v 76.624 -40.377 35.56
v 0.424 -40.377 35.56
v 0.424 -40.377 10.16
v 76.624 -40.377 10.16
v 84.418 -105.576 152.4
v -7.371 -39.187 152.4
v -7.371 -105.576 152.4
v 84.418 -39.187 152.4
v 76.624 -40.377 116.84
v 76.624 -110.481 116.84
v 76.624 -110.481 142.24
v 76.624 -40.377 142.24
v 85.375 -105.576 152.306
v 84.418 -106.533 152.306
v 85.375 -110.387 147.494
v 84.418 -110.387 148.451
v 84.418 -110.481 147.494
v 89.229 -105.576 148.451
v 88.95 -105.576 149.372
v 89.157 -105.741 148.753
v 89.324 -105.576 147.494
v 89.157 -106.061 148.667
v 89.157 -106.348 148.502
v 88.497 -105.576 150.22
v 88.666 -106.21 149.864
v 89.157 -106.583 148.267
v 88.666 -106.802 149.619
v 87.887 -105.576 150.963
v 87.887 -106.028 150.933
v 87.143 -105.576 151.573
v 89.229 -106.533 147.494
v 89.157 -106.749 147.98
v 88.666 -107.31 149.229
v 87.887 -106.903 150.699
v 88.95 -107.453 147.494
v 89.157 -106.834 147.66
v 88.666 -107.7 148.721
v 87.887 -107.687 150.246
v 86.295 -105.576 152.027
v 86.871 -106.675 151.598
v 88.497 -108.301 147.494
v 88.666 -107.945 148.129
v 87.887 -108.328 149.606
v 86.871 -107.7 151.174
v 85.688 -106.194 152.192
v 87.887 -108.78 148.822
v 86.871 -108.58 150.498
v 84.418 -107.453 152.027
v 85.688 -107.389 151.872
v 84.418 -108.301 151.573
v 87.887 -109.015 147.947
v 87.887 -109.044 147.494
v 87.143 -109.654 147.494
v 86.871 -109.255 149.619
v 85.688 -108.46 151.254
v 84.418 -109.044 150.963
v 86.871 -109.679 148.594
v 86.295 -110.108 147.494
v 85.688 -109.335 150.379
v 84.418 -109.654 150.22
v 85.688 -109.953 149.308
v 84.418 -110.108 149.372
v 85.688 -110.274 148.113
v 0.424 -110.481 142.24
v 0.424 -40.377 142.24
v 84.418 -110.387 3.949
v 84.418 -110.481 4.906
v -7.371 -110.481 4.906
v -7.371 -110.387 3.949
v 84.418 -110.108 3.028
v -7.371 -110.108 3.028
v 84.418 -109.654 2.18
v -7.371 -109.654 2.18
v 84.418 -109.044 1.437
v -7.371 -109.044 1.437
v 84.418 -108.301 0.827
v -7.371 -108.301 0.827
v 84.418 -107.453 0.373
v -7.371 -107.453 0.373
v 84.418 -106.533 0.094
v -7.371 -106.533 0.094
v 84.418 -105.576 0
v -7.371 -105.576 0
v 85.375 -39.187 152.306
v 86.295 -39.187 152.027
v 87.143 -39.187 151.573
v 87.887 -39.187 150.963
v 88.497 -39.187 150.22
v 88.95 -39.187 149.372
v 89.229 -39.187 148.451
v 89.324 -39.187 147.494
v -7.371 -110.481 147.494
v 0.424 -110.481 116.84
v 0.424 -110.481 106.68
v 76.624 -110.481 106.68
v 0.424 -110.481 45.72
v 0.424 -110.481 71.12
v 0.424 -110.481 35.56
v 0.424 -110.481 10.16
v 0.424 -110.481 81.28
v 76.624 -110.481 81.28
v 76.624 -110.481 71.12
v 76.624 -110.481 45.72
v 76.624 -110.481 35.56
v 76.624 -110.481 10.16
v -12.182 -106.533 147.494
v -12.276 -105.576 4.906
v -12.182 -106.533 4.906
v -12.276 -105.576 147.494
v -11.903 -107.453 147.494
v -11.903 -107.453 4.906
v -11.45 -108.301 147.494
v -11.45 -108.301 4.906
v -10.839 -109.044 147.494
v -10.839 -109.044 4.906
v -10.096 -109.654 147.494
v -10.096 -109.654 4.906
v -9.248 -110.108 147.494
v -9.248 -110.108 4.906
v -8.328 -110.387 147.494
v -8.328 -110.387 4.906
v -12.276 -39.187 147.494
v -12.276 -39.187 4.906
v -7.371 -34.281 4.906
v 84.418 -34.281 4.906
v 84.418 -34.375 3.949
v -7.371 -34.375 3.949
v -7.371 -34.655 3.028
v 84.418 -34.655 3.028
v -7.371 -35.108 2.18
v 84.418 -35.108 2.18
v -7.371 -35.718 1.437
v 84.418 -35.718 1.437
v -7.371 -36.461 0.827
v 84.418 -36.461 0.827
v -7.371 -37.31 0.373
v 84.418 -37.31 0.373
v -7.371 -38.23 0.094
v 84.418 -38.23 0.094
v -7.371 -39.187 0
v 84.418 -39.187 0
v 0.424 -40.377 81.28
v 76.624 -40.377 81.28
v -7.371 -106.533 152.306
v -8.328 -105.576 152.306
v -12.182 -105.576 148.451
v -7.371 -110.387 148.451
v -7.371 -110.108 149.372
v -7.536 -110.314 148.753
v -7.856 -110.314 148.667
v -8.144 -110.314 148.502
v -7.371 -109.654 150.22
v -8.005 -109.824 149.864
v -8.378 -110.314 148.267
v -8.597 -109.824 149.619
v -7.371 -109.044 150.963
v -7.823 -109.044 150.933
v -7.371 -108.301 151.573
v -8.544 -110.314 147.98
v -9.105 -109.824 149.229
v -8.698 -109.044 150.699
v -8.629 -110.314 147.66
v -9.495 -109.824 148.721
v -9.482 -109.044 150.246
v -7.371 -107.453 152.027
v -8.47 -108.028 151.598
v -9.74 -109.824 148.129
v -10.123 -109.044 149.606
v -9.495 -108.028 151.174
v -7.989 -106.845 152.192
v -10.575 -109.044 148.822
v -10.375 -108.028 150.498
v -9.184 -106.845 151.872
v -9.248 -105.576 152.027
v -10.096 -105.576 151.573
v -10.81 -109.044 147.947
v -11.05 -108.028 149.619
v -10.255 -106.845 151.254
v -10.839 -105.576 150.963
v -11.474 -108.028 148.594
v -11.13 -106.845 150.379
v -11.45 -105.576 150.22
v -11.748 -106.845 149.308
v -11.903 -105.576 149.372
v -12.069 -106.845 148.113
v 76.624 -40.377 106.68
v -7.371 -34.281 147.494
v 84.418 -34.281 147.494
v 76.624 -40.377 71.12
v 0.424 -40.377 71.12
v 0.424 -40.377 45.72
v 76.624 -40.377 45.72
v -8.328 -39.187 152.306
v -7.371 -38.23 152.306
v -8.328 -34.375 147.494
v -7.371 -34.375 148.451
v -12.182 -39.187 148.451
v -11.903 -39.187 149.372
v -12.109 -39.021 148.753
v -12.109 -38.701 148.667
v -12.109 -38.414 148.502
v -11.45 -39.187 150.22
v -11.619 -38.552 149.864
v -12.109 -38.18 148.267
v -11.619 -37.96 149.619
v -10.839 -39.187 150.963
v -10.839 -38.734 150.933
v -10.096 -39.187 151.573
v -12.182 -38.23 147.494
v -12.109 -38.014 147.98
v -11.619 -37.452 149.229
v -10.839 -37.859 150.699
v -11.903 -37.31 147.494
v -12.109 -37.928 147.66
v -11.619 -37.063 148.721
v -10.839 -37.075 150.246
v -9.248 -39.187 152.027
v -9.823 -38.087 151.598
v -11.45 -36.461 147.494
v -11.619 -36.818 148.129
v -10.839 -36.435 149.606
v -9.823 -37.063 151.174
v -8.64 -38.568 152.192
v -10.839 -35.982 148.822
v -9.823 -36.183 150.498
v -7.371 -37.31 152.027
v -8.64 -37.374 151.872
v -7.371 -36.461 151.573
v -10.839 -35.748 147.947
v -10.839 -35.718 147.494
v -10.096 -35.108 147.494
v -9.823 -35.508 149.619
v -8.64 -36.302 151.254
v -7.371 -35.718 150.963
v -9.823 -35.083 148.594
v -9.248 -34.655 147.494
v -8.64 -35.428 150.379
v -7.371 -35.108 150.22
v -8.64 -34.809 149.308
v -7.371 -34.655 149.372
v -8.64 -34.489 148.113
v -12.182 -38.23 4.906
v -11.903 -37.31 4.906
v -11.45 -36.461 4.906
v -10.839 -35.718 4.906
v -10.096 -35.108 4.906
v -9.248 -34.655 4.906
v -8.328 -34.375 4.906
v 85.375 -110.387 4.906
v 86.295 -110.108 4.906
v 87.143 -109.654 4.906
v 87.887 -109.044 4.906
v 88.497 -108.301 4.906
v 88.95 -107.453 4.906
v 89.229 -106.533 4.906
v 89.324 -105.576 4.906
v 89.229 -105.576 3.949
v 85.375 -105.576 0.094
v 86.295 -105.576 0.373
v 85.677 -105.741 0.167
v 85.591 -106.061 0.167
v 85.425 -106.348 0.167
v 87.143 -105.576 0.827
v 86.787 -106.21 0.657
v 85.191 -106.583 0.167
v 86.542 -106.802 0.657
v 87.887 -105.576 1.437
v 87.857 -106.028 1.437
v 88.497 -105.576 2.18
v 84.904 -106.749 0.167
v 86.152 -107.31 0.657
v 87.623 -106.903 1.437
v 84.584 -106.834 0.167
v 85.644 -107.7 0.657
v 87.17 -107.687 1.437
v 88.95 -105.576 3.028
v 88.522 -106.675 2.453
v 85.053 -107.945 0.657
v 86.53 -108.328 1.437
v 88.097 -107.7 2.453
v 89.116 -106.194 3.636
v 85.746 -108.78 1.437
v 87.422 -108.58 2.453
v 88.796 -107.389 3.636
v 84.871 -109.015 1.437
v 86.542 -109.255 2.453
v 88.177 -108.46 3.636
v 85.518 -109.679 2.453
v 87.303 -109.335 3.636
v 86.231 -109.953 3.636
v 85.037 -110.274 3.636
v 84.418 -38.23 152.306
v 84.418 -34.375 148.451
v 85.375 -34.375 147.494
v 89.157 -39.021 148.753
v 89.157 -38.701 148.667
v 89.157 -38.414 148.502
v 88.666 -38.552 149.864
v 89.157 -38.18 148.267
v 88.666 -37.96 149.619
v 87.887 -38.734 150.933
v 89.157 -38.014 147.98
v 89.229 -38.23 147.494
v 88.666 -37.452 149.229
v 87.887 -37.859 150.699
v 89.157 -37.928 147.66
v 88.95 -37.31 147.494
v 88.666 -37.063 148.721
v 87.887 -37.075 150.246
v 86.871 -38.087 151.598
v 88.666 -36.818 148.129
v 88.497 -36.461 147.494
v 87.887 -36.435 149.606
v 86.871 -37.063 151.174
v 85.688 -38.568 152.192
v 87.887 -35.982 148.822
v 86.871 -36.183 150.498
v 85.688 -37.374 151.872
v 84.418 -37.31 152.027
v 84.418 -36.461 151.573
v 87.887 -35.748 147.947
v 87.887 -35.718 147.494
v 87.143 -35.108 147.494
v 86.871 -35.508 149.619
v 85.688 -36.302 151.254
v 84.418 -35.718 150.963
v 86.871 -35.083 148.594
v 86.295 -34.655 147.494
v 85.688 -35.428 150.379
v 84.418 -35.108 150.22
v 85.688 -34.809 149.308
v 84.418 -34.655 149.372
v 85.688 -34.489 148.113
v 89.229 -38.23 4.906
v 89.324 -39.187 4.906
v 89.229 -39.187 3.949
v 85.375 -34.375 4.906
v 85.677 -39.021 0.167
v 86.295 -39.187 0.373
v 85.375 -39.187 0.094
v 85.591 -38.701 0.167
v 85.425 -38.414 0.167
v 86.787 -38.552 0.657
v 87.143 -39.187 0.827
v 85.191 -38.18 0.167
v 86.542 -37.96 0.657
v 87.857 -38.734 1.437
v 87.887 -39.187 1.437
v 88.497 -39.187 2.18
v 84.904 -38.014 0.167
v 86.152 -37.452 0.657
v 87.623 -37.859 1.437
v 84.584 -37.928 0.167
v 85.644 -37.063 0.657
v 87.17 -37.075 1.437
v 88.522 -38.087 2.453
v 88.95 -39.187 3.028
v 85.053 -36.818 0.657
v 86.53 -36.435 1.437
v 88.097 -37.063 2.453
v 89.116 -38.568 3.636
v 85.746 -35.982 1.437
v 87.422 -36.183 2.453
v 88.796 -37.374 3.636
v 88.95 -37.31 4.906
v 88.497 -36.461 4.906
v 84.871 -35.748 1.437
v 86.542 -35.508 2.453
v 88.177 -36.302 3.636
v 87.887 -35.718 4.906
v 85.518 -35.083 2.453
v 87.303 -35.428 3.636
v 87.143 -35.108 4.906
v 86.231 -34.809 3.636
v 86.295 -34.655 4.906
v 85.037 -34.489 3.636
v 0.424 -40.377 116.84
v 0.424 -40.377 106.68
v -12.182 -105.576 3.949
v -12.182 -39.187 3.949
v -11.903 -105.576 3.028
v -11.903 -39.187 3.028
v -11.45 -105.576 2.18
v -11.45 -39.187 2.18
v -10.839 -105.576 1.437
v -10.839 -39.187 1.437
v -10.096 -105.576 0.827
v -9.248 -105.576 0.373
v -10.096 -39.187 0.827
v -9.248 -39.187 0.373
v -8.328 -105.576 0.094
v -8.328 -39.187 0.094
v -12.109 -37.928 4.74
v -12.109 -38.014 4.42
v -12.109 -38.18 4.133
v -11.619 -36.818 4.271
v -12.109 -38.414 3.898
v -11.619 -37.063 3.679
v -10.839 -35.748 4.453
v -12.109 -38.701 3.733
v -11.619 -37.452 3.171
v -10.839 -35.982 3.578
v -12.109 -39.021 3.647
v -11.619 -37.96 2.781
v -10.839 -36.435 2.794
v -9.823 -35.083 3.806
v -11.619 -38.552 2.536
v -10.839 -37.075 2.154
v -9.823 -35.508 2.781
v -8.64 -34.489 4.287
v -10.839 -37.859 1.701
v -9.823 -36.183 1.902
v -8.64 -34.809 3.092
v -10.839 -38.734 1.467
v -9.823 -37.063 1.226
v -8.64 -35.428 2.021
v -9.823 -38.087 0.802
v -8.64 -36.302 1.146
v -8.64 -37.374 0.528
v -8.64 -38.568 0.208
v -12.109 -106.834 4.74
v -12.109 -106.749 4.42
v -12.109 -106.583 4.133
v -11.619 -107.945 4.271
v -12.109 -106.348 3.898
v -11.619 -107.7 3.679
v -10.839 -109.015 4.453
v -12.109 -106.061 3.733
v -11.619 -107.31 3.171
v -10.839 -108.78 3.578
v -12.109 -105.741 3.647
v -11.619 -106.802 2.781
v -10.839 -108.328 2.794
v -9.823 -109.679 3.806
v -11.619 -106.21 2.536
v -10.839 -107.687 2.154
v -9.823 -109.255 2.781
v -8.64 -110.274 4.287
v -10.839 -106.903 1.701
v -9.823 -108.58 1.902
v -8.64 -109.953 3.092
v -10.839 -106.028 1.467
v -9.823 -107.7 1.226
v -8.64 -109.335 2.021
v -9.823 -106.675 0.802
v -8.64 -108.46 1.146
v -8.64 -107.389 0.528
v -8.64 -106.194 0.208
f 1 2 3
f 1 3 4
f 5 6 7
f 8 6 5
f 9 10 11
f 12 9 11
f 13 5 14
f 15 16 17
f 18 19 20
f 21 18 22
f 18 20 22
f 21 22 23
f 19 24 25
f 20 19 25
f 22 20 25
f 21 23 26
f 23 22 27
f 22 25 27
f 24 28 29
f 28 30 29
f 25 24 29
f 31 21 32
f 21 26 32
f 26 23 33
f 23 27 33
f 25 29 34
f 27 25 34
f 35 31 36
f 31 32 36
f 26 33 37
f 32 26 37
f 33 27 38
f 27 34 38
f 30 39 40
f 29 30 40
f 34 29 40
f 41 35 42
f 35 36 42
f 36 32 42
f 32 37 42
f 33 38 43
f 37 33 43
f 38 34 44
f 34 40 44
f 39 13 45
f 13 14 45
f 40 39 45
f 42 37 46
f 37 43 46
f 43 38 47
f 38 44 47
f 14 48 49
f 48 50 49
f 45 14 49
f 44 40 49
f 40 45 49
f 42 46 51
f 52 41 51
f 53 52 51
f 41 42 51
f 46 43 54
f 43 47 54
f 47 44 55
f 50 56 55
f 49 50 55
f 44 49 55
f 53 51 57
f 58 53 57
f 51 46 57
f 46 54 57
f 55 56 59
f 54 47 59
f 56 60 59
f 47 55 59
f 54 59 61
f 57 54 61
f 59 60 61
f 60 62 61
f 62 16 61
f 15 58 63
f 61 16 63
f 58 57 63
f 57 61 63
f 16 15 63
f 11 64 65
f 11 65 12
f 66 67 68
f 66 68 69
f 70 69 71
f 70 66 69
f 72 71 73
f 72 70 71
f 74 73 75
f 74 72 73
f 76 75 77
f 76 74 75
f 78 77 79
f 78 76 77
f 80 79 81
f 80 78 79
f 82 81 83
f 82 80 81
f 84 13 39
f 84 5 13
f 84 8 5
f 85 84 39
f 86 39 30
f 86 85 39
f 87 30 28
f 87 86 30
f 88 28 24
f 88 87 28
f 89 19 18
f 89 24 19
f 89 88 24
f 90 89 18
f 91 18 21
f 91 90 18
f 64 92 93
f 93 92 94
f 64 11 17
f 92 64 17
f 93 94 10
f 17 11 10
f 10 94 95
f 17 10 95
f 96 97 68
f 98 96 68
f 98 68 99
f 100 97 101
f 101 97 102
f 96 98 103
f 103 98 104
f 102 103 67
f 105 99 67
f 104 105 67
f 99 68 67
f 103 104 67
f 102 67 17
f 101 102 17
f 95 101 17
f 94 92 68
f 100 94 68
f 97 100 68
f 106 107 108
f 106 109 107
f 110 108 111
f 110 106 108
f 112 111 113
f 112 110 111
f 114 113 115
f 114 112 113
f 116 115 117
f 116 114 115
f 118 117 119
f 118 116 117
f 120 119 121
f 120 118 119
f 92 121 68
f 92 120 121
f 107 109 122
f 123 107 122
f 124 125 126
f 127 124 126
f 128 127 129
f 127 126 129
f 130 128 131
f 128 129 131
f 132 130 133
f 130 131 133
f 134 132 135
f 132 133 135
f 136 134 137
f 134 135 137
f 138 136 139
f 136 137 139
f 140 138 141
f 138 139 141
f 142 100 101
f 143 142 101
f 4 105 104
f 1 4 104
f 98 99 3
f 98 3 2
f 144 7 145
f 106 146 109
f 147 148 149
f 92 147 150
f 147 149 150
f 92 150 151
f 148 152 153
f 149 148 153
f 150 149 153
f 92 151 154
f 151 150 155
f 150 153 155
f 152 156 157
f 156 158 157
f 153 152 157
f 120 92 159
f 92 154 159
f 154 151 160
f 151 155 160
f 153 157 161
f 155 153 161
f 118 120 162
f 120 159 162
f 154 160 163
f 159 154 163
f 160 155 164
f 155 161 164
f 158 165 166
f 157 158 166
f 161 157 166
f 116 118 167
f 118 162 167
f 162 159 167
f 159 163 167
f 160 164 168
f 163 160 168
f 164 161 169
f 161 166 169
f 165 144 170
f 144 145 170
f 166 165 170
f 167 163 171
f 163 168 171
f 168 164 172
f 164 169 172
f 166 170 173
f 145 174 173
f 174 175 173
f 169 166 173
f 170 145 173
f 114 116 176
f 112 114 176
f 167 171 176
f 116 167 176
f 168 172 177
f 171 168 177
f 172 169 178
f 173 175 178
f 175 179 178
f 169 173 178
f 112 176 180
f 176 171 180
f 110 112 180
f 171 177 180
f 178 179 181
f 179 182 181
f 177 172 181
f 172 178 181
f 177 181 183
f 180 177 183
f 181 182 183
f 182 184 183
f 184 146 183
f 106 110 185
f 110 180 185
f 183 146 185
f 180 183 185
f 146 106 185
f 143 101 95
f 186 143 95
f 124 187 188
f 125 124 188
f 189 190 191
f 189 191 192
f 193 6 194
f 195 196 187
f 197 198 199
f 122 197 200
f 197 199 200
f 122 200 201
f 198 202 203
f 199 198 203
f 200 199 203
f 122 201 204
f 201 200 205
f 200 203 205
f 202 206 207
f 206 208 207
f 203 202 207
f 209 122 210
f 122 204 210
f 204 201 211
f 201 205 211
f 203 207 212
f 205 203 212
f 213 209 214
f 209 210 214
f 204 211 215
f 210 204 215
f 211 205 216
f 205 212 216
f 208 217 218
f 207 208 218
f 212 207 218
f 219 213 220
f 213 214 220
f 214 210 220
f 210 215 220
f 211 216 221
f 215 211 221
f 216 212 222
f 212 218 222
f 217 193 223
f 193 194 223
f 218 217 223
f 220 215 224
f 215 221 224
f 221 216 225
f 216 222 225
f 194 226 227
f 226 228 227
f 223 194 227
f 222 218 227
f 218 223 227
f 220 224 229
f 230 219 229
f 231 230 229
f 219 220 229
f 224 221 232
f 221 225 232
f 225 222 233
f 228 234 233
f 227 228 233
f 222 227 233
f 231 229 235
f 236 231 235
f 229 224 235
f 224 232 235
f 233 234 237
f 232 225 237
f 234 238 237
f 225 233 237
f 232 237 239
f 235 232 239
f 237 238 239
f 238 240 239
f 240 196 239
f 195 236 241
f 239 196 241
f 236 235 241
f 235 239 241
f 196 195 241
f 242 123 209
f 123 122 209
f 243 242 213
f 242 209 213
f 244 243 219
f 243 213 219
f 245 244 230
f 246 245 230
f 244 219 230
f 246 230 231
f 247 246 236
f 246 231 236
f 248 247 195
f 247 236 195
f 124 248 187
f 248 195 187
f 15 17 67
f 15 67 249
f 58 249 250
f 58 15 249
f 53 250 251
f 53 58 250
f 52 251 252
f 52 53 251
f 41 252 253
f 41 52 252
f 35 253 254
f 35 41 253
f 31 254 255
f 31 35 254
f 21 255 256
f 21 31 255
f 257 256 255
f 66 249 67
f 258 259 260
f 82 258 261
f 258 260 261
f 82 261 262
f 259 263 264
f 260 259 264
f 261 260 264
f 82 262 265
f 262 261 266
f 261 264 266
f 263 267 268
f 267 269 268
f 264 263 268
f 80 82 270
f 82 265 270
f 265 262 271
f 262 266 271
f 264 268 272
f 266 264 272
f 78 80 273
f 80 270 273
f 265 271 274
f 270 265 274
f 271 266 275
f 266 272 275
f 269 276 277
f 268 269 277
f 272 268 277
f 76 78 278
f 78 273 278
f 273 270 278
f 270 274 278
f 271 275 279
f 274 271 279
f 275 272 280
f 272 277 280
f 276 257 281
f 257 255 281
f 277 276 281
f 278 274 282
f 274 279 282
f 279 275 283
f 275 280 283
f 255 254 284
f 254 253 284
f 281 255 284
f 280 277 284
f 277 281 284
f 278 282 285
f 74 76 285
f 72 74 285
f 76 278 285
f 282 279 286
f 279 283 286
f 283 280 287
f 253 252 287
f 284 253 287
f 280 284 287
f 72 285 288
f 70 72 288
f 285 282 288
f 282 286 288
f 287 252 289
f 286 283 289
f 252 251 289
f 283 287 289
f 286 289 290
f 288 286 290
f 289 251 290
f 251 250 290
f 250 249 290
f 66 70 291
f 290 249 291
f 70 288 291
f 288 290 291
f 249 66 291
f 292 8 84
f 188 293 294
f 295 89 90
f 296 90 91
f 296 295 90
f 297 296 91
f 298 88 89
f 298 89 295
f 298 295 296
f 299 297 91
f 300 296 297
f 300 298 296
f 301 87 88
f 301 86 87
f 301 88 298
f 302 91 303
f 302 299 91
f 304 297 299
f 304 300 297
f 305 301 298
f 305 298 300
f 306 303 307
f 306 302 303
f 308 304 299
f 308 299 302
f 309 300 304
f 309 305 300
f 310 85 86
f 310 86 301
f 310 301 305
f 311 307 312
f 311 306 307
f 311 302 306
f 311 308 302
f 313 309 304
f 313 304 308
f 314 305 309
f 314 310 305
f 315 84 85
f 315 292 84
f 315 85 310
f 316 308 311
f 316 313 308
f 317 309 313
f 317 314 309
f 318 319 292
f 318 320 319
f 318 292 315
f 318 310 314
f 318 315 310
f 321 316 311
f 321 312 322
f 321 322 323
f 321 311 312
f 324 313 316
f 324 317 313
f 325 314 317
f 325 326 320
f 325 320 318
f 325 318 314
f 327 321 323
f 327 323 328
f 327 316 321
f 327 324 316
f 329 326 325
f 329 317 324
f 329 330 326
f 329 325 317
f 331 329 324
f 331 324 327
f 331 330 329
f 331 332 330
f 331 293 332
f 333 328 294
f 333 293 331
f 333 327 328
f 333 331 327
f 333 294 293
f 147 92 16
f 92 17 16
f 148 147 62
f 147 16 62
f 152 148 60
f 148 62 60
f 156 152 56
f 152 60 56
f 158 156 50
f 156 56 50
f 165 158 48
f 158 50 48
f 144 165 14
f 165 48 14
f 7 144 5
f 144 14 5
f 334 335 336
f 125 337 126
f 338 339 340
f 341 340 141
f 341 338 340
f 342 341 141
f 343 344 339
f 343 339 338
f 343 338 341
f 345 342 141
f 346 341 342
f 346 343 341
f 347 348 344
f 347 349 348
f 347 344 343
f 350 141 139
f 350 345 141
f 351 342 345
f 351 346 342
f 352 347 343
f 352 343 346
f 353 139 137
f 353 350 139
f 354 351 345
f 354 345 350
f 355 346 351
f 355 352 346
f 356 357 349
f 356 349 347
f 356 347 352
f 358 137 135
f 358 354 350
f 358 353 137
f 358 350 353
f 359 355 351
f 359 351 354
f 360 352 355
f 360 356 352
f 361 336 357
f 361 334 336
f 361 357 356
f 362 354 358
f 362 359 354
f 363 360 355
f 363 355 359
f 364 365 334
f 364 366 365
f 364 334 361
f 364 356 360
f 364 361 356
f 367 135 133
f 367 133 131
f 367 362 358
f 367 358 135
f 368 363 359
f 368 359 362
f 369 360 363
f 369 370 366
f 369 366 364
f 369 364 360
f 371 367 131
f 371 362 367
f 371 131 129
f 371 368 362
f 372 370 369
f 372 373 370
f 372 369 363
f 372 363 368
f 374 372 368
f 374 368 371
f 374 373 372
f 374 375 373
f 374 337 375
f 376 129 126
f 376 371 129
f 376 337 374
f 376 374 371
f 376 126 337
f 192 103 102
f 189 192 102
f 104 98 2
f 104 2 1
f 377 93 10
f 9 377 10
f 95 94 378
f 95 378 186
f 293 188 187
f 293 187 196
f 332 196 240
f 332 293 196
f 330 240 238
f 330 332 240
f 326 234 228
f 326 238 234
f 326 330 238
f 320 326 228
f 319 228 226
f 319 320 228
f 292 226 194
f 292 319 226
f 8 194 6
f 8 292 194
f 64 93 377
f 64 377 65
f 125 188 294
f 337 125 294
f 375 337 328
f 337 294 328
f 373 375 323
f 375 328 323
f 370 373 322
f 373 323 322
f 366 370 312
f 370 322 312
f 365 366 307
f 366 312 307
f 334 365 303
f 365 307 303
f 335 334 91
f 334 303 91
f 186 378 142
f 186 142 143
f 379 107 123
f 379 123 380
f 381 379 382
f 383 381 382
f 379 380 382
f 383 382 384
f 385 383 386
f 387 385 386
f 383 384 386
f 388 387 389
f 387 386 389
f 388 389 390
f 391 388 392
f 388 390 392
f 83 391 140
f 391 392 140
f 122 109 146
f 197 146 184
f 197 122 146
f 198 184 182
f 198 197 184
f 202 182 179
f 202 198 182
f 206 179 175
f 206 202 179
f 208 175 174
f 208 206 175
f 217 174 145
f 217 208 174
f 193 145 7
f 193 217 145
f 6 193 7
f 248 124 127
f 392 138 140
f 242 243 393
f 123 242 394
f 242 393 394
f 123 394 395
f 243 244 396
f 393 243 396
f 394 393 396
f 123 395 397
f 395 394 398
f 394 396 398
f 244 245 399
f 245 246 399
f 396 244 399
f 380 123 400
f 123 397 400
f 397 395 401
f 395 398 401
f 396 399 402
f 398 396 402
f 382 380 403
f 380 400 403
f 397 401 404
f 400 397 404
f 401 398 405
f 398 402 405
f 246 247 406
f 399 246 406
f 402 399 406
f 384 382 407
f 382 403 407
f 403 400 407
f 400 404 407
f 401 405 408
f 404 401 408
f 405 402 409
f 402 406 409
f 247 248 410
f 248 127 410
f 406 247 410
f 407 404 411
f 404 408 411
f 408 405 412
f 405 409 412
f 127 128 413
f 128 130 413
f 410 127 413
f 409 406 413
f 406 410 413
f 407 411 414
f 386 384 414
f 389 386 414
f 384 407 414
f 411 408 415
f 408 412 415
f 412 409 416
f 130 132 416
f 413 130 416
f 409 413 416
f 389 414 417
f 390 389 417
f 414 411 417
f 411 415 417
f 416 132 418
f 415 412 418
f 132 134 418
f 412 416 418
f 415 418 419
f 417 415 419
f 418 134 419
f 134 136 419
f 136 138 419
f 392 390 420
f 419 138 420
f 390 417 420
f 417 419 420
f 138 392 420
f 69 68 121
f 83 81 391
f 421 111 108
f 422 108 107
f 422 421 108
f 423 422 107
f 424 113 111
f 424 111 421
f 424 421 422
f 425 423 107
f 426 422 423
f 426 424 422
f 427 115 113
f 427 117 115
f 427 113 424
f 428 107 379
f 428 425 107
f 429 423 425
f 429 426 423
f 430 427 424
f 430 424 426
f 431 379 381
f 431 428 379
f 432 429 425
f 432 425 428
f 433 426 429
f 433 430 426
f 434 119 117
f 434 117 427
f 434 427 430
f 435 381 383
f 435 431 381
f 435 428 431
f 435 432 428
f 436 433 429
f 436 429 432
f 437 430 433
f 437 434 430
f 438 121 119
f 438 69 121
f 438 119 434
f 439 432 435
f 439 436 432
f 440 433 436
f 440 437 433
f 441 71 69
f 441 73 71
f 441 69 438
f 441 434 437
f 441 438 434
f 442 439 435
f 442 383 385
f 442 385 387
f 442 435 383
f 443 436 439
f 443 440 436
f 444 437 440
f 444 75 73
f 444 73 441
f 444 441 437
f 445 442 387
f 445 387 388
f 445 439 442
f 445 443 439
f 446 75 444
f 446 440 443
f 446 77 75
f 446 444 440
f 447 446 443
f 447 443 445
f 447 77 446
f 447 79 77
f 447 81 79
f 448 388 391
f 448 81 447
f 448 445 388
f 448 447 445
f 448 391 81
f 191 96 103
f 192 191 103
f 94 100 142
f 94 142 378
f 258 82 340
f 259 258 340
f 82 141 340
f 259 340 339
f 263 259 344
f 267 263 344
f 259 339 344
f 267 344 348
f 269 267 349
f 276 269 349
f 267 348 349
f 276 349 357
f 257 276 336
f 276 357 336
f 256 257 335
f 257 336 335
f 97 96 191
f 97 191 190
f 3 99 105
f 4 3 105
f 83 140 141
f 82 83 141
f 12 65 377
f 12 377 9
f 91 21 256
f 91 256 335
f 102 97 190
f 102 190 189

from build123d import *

# Parameters (mm, degrees)
F0_W     = 101.6
F0_H     = 76.2
F1_DEPTH = 152.4
F2_W     = 76.2
F2_H     = 25.4
F3_DEPTH = 70.104
F4_R     = 4.905682


with BuildPart() as f1:
    # F0 (on Top) → F1 (new body)
    with BuildSketch(Plane.XY):
        with Locations((38.523726, -72.381201)):
            Rectangle(F0_W, F0_H)
    extrude(amount=F1_DEPTH)

    # F2 (on face) → F3 (cut)
    with BuildSketch(Plane.XZ.offset(110.481201)):
        with Locations((38.523726, 129.54)):
            Rectangle(F2_W, F2_H)
        with Locations((38.523726, 93.98)):
            Rectangle(F2_W, F2_H)
        with Locations((38.523726, 58.42)):
            Rectangle(F2_W, F2_H)
        with Locations((38.523726, 22.86)):
            Rectangle(F2_W, F2_H)
    extrude(amount=-F3_DEPTH, mode=Mode.SUBTRACT)

    # F4
    f4_edges = [f1.edges().sort_by_distance(p)[0] for p in [
        (38.523726, -34.281201, 152.4),
        (-12.276274, -72.381201, 152.4),
        (38.523726, -110.481201, 152.4),
        (89.323726, -72.381201, 152.4),
        (89.323726, -110.481201, 76.2),
        (89.323726, -34.281201, 76.2),
        (89.323726, -72.381201, 0),
        (38.523726, -110.481201, 0),
        (38.523726, -34.281201, 0),
        (-12.276274, -34.281201, 76.2),
        (-12.276274, -110.481201, 76.2),
        (-12.276274, -72.381201, 0),
    ]]
    fillet(f4_edges, radius=F4_R)


solid = f1.part
